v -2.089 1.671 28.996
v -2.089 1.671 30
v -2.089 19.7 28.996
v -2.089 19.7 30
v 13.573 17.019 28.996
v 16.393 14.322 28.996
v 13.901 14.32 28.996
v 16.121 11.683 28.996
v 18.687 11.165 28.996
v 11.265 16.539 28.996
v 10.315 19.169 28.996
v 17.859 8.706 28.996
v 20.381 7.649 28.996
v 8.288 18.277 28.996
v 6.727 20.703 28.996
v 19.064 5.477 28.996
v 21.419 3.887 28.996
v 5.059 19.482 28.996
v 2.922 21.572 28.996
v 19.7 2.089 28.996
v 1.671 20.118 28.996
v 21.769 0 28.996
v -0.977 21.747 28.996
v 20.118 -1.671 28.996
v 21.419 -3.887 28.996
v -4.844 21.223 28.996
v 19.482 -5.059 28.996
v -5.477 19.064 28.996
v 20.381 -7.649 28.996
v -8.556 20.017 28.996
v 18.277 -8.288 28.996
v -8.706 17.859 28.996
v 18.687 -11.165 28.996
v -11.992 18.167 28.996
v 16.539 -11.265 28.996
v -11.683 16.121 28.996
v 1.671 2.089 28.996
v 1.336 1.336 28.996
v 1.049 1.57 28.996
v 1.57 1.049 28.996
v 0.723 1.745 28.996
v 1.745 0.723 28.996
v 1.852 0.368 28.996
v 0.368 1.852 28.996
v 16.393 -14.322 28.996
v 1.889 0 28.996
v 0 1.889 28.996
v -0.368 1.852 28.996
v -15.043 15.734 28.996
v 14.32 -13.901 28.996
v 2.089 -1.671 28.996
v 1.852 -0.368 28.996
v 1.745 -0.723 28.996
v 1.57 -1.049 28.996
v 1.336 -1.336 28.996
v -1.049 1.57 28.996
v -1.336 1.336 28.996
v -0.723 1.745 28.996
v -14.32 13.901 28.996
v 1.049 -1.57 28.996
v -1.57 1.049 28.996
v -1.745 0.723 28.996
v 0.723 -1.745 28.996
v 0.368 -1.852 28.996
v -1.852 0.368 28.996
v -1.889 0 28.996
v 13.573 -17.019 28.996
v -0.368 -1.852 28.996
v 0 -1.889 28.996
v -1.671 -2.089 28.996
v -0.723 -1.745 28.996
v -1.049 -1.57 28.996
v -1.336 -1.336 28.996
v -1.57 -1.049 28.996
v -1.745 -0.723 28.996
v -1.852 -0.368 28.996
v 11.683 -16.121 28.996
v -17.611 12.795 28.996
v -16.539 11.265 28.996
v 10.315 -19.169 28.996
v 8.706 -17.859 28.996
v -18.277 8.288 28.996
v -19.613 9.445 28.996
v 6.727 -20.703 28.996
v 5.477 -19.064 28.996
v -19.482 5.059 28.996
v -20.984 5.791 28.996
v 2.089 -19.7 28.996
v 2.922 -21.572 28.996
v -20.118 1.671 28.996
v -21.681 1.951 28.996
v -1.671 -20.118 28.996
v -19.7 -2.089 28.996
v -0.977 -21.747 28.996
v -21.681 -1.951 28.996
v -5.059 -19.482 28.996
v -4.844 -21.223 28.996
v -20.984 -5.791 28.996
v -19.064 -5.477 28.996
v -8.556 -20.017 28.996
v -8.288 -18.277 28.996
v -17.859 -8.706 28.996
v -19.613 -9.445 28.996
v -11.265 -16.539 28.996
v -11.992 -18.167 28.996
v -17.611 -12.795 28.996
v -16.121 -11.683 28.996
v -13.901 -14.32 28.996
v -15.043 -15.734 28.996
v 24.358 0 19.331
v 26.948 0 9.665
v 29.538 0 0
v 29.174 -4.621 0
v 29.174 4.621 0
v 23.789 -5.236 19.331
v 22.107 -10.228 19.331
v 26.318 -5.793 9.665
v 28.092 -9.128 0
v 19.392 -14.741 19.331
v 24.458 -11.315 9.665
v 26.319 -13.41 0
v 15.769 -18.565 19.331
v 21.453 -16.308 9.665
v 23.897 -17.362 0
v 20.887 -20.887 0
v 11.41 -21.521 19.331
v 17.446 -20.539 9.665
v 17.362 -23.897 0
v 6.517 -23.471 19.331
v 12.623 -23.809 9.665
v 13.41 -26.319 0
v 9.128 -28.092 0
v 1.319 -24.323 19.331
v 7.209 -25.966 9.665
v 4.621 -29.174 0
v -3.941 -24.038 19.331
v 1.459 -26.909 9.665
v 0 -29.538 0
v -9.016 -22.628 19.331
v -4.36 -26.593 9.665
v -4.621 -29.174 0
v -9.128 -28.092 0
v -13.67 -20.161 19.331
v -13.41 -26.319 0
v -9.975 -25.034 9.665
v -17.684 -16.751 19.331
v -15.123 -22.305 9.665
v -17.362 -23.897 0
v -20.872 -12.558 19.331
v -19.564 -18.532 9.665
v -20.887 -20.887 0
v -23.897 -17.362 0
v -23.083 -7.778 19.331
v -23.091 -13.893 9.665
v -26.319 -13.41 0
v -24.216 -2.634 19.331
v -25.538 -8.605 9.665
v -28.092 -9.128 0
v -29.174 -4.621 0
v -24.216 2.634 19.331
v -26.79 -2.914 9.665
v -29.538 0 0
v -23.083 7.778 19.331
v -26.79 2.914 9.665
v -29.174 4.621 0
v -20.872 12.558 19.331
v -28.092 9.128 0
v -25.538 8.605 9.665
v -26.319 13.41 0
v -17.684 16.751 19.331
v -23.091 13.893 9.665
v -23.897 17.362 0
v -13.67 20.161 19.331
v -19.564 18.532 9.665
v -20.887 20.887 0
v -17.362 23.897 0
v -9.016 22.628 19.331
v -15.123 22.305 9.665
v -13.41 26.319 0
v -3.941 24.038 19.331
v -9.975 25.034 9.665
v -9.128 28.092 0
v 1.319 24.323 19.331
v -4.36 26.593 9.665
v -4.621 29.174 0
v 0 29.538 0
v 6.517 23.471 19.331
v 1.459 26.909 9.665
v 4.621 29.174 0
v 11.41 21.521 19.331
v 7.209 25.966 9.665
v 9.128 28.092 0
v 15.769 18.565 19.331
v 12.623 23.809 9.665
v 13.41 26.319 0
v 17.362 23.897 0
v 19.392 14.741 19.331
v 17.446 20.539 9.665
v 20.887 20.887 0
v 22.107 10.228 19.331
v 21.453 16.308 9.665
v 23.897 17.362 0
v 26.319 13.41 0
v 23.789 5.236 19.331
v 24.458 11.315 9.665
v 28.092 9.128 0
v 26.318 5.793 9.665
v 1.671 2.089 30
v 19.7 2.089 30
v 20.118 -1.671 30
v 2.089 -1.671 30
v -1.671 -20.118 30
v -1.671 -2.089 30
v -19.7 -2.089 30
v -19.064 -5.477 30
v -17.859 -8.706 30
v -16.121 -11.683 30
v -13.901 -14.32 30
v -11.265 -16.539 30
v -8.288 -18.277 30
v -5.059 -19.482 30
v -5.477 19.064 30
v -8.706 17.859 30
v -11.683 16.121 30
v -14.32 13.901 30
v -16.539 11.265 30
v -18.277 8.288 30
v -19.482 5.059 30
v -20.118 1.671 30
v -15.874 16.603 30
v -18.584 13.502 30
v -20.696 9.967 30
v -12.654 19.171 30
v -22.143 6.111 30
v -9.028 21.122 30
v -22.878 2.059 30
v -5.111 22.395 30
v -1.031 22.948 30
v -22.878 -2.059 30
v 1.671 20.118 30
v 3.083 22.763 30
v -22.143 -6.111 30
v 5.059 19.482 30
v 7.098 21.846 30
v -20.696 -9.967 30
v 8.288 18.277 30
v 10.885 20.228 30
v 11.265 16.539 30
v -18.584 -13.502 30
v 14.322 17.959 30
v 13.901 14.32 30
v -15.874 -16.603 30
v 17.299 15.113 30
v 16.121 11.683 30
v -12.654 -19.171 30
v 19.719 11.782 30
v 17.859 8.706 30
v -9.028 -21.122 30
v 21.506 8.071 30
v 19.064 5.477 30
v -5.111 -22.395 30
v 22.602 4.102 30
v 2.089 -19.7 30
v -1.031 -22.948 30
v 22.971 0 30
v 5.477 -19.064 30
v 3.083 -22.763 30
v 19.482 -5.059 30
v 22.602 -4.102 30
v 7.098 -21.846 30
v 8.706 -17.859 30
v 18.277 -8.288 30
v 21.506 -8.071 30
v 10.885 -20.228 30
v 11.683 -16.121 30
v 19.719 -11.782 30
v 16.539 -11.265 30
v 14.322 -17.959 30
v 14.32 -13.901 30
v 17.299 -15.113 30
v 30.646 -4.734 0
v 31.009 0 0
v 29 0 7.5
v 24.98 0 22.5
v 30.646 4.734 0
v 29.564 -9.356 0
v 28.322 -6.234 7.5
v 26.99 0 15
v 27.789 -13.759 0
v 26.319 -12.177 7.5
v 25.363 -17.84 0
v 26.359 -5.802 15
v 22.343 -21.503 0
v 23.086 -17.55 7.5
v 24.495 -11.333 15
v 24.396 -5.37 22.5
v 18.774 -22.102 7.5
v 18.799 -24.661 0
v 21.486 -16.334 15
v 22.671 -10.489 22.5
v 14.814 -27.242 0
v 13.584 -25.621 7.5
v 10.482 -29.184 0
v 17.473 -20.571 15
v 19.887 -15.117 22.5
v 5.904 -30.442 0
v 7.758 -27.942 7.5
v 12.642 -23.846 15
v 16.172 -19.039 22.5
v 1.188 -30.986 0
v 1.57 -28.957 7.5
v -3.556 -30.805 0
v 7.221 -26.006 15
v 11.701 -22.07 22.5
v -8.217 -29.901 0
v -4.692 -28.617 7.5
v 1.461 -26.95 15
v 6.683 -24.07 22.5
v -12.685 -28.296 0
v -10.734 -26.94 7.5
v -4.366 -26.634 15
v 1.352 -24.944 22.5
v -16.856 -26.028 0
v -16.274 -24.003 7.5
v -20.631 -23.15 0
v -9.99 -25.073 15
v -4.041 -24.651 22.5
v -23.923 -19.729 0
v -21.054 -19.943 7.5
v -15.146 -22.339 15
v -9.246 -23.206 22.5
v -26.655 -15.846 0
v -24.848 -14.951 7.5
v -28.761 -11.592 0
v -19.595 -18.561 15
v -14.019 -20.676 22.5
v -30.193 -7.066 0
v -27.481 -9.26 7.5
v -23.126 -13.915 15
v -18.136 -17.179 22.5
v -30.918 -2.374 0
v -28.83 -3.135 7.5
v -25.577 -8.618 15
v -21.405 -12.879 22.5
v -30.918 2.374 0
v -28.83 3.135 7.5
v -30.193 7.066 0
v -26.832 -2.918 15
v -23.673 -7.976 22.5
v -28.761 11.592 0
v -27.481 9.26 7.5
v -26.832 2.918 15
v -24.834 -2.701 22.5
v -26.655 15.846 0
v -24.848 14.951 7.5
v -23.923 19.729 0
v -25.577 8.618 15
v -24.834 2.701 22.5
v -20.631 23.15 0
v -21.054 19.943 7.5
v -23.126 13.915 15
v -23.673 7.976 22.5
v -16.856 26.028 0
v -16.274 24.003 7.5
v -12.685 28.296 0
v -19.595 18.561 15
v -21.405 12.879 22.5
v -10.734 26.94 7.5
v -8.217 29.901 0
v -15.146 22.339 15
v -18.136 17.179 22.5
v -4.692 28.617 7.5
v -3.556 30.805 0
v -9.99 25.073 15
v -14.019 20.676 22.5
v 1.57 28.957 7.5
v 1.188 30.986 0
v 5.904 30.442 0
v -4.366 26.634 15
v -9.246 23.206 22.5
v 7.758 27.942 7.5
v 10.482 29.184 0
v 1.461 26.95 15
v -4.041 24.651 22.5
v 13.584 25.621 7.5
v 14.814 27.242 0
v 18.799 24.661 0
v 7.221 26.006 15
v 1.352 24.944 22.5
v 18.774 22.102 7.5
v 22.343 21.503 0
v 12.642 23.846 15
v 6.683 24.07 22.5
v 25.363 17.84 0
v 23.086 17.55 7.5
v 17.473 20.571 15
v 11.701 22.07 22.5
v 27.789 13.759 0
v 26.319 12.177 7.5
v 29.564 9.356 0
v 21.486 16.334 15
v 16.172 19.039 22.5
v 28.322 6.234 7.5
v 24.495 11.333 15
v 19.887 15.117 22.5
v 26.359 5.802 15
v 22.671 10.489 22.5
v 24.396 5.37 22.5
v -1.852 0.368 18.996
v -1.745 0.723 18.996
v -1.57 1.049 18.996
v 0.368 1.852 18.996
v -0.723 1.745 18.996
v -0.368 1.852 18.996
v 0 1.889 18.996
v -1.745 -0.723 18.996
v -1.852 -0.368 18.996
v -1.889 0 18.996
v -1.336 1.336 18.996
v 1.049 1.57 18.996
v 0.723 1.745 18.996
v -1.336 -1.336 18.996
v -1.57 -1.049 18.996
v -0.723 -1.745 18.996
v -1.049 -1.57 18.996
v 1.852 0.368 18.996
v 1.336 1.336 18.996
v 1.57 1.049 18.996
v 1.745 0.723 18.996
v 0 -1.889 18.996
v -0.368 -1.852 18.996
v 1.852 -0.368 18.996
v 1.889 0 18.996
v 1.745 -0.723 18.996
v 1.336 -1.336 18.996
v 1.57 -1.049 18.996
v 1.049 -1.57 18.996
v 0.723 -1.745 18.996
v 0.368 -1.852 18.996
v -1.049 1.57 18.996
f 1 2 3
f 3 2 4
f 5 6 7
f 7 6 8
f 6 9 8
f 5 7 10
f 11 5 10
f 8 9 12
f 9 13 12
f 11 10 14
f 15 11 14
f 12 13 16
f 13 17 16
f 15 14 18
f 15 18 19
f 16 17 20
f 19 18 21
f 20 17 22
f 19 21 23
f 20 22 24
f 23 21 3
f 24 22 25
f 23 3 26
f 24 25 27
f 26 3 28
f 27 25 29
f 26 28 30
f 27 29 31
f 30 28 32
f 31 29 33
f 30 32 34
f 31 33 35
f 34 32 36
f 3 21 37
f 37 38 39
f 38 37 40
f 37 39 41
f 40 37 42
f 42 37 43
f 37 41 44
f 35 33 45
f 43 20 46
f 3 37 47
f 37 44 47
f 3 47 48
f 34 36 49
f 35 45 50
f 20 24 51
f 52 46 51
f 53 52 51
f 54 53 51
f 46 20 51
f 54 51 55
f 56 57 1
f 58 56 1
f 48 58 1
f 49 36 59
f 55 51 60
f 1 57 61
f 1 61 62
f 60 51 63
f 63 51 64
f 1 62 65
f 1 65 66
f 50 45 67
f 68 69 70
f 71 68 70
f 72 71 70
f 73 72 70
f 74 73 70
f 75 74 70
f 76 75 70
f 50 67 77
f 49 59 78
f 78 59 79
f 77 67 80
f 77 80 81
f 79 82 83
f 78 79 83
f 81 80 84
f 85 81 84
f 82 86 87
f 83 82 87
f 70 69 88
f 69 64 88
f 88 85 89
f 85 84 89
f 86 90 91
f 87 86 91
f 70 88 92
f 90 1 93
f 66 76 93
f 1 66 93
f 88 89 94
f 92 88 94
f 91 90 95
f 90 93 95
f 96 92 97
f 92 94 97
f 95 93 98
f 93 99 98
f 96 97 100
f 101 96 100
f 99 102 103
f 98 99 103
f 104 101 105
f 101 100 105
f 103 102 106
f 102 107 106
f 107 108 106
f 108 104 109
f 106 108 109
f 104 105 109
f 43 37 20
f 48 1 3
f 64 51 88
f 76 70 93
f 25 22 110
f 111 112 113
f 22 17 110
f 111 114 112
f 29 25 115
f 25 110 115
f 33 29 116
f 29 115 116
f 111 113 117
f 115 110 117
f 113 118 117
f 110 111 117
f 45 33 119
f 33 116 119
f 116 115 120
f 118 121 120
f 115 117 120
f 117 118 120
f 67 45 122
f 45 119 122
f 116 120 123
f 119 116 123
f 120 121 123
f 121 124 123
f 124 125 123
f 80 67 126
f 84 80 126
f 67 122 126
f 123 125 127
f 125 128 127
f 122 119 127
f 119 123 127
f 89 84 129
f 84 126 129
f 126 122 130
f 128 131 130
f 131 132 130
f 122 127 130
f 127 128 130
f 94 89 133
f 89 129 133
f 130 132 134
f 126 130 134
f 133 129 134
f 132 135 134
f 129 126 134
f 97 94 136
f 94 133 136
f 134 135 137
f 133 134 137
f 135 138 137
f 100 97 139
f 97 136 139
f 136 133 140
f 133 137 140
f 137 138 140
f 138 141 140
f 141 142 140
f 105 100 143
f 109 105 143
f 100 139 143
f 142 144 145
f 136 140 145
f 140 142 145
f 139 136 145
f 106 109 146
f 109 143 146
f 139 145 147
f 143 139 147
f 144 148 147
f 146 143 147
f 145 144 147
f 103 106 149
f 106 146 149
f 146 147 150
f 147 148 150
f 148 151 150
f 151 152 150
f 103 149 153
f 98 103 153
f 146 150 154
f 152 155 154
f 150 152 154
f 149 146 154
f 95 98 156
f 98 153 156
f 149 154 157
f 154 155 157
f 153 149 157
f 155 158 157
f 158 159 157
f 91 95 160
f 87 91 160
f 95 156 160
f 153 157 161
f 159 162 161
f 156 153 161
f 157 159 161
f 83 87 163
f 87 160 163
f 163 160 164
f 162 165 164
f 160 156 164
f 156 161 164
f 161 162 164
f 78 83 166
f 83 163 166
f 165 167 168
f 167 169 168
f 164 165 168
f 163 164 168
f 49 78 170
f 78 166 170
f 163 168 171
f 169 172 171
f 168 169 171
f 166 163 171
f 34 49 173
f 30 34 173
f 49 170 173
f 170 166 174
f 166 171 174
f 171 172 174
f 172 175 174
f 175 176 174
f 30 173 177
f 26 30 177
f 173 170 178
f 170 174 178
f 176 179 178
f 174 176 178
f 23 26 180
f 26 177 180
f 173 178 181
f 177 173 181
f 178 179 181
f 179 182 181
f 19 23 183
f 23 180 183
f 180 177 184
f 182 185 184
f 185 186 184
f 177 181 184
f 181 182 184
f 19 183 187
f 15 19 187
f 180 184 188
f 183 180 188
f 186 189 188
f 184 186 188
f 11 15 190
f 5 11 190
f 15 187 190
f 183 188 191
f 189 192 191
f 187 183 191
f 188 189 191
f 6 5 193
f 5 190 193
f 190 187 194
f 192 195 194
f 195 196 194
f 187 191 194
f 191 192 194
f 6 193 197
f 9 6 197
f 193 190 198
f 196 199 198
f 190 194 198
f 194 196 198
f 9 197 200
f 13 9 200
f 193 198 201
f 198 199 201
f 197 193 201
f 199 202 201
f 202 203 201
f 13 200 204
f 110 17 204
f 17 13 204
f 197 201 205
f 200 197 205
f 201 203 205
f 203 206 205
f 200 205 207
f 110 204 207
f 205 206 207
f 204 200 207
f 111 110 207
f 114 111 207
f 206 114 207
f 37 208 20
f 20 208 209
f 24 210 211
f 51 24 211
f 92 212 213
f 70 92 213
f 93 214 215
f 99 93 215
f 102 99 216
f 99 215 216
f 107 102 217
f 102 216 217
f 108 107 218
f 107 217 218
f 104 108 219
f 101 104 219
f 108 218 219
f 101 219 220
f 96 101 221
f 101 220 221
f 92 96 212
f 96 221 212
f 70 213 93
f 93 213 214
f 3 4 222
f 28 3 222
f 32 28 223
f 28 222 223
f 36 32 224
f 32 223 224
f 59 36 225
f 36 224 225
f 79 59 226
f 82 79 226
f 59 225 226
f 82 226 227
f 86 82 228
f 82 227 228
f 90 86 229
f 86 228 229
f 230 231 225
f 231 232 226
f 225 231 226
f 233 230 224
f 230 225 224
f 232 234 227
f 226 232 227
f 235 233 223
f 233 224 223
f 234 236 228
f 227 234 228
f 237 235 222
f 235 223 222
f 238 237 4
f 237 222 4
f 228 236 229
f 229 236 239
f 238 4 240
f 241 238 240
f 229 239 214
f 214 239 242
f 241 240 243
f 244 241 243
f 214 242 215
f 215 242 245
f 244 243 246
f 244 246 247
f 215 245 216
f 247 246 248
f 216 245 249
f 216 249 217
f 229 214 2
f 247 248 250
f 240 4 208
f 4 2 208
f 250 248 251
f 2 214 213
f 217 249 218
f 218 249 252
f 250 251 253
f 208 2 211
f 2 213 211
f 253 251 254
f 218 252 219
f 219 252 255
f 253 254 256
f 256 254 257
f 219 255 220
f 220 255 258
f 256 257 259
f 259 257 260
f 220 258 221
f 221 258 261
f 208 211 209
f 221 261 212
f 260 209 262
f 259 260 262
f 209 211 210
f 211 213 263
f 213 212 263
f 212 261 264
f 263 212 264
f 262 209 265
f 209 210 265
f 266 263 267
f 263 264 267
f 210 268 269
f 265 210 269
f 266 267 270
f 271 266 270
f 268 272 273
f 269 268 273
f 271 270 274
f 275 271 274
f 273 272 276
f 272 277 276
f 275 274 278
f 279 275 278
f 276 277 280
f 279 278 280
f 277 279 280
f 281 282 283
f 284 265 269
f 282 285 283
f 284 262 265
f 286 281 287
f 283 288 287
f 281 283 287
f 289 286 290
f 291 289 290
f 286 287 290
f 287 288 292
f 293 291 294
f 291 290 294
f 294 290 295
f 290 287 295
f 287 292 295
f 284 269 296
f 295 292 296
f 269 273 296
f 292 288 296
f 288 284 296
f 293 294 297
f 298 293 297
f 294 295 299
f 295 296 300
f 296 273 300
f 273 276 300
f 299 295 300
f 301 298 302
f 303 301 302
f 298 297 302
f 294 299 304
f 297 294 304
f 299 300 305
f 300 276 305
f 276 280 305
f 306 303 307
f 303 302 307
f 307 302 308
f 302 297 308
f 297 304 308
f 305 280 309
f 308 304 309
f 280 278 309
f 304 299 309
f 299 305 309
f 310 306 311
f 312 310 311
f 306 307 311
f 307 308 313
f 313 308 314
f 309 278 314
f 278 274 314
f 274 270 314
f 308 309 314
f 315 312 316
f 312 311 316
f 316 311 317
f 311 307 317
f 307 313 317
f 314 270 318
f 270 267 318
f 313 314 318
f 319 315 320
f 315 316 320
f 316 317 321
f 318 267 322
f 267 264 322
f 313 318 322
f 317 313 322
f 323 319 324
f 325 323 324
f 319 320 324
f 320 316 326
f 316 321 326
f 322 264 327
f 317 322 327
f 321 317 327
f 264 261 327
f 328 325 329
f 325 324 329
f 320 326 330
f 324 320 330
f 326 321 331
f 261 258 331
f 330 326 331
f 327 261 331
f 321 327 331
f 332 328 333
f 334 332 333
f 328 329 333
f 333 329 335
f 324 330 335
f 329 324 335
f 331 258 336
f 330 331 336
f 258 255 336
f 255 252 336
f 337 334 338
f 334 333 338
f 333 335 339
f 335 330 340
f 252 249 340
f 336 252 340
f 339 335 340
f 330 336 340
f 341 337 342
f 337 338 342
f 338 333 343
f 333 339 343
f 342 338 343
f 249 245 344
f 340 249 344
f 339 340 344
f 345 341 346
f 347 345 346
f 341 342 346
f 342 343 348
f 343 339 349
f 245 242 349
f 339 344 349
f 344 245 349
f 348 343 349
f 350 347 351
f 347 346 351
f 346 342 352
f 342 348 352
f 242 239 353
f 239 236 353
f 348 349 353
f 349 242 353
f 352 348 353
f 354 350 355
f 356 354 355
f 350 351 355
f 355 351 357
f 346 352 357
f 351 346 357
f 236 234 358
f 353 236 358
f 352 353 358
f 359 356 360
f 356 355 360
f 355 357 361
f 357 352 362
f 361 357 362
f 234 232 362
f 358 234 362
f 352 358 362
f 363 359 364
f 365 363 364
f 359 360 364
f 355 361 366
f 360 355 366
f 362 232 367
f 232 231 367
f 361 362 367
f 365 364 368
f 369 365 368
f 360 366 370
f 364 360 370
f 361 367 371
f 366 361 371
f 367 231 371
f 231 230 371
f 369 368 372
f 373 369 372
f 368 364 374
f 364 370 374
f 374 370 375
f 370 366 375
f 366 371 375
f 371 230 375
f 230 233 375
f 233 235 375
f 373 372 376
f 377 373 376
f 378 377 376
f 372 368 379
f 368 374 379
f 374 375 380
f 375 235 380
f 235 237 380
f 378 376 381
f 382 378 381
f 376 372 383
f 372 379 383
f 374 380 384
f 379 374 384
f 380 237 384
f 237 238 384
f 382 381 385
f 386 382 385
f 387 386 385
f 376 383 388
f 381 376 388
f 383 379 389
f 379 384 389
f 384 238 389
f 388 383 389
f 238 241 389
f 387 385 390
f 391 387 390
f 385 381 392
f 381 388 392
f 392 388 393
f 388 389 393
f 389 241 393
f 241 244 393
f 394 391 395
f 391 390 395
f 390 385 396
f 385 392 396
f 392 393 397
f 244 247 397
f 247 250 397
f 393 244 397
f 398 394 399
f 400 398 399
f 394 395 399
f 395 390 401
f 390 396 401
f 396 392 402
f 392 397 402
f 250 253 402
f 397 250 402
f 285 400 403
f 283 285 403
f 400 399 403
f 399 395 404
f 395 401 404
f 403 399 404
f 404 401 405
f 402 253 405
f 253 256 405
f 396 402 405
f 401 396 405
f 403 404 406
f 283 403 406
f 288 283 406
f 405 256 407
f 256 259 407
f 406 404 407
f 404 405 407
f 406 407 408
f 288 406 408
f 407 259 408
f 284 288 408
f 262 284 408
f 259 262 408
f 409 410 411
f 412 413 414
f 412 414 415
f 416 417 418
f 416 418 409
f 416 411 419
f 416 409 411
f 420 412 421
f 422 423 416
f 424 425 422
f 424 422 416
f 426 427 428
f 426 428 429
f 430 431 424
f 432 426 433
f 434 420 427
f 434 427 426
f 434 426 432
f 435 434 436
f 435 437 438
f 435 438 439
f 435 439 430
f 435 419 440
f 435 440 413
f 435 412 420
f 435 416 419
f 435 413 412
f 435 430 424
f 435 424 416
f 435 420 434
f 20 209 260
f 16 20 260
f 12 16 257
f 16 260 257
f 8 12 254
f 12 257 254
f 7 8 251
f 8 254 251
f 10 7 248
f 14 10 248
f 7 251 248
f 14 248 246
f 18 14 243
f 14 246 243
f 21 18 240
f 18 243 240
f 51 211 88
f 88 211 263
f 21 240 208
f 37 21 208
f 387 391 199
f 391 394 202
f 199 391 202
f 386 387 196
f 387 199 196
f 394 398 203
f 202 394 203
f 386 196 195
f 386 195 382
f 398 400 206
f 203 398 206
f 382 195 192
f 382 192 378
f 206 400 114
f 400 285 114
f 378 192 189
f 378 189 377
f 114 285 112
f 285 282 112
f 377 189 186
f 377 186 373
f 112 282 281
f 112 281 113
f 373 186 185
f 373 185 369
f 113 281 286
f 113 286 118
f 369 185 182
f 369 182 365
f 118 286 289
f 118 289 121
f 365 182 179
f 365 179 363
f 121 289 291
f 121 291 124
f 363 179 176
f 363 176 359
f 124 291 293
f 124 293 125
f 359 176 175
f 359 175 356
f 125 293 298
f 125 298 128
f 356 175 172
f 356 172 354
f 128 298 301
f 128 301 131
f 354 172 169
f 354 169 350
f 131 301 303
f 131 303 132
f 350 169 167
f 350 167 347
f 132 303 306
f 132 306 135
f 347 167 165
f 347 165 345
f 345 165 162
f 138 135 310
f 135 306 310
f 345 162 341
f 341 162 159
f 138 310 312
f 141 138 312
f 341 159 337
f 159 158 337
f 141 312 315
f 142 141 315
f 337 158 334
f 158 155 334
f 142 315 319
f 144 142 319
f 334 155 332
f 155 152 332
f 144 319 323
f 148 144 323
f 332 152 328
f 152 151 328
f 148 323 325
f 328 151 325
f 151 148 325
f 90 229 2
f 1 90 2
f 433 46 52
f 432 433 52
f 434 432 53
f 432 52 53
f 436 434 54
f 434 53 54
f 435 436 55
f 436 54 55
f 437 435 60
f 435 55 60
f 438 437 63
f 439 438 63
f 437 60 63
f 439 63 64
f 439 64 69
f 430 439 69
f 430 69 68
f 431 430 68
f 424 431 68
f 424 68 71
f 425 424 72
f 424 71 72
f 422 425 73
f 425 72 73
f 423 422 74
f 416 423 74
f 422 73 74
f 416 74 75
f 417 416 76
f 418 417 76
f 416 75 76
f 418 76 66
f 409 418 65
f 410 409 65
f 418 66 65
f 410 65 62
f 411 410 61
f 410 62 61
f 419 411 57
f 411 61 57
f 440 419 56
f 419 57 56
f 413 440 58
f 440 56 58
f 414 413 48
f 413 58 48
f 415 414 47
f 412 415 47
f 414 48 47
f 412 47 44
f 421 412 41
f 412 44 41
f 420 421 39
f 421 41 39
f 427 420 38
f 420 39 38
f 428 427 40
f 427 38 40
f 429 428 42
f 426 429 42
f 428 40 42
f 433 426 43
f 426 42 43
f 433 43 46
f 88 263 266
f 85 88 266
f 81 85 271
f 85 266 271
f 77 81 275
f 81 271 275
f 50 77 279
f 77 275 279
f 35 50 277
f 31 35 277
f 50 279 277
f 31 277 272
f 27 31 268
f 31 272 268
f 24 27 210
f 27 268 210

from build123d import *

# Parameters (mm, degrees)
F3_DEPTH = 25
F4_R     = 1.888711
F5_DEPTH = 10


with BuildPart() as f1:
    # F0 (on Front) → F1 (revolve)
    with BuildSketch(Plane.XZ):
        Polygon((21.7686, 28.996194), (29.538106, 0), (31.009124, 0), (22.970648, 30), (0, 30), (0, 28.996194), align=None)
    revolve(axis=Axis((0, 0, 15), (0, 0, -1)))

    # F2 (on face) → F3 (cut)
    with BuildSketch(Plane.XY.offset(30)):
        with BuildLine():
            Line((-2.089355, 1.671198), (-2.089355, 19.700249))
            ThreePointArc((-2.089355, 19.700249), (-14.319559, 13.901403), (-20.118406, 1.671198))
            Line((-20.118406, 1.671198), (-2.089355, 1.671198))
        make_face()
        with BuildLine():
            Line((1.671198, 20.118406), (1.671198, 2.089355))
            Line((1.671198, 2.089355), (19.700249, 2.089355))
            ThreePointArc((19.700249, 2.089355), (13.901403, 14.319559), (1.671198, 20.118406))
        make_face()
        with BuildLine():
            Line((-1.671198, -2.089355), (-19.700249, -2.089355))
            ThreePointArc((-19.700249, -2.089355), (-13.901403, -14.319559), (-1.671198, -20.118406))
            Line((-1.671198, -20.118406), (-1.671198, -2.089355))
        make_face()
        with BuildLine():
            Line((2.089355, -1.671198), (2.089355, -19.700249))
            ThreePointArc((2.089355, -19.700249), (14.319559, -13.901403), (20.118406, -1.671198))
            Line((20.118406, -1.671198), (2.089355, -1.671198))
        make_face()
    extrude(amount=-F3_DEPTH, mode=Mode.SUBTRACT)

    # F4 (on face) → F5 (join)
    with BuildSketch(Plane(origin=(0, 0, 28.996194), x_dir=(1, 0, 0), z_dir=(0, 0, -1))):
        Circle(F4_R)
    extrude(amount=F5_DEPTH)


solid = f1.part
